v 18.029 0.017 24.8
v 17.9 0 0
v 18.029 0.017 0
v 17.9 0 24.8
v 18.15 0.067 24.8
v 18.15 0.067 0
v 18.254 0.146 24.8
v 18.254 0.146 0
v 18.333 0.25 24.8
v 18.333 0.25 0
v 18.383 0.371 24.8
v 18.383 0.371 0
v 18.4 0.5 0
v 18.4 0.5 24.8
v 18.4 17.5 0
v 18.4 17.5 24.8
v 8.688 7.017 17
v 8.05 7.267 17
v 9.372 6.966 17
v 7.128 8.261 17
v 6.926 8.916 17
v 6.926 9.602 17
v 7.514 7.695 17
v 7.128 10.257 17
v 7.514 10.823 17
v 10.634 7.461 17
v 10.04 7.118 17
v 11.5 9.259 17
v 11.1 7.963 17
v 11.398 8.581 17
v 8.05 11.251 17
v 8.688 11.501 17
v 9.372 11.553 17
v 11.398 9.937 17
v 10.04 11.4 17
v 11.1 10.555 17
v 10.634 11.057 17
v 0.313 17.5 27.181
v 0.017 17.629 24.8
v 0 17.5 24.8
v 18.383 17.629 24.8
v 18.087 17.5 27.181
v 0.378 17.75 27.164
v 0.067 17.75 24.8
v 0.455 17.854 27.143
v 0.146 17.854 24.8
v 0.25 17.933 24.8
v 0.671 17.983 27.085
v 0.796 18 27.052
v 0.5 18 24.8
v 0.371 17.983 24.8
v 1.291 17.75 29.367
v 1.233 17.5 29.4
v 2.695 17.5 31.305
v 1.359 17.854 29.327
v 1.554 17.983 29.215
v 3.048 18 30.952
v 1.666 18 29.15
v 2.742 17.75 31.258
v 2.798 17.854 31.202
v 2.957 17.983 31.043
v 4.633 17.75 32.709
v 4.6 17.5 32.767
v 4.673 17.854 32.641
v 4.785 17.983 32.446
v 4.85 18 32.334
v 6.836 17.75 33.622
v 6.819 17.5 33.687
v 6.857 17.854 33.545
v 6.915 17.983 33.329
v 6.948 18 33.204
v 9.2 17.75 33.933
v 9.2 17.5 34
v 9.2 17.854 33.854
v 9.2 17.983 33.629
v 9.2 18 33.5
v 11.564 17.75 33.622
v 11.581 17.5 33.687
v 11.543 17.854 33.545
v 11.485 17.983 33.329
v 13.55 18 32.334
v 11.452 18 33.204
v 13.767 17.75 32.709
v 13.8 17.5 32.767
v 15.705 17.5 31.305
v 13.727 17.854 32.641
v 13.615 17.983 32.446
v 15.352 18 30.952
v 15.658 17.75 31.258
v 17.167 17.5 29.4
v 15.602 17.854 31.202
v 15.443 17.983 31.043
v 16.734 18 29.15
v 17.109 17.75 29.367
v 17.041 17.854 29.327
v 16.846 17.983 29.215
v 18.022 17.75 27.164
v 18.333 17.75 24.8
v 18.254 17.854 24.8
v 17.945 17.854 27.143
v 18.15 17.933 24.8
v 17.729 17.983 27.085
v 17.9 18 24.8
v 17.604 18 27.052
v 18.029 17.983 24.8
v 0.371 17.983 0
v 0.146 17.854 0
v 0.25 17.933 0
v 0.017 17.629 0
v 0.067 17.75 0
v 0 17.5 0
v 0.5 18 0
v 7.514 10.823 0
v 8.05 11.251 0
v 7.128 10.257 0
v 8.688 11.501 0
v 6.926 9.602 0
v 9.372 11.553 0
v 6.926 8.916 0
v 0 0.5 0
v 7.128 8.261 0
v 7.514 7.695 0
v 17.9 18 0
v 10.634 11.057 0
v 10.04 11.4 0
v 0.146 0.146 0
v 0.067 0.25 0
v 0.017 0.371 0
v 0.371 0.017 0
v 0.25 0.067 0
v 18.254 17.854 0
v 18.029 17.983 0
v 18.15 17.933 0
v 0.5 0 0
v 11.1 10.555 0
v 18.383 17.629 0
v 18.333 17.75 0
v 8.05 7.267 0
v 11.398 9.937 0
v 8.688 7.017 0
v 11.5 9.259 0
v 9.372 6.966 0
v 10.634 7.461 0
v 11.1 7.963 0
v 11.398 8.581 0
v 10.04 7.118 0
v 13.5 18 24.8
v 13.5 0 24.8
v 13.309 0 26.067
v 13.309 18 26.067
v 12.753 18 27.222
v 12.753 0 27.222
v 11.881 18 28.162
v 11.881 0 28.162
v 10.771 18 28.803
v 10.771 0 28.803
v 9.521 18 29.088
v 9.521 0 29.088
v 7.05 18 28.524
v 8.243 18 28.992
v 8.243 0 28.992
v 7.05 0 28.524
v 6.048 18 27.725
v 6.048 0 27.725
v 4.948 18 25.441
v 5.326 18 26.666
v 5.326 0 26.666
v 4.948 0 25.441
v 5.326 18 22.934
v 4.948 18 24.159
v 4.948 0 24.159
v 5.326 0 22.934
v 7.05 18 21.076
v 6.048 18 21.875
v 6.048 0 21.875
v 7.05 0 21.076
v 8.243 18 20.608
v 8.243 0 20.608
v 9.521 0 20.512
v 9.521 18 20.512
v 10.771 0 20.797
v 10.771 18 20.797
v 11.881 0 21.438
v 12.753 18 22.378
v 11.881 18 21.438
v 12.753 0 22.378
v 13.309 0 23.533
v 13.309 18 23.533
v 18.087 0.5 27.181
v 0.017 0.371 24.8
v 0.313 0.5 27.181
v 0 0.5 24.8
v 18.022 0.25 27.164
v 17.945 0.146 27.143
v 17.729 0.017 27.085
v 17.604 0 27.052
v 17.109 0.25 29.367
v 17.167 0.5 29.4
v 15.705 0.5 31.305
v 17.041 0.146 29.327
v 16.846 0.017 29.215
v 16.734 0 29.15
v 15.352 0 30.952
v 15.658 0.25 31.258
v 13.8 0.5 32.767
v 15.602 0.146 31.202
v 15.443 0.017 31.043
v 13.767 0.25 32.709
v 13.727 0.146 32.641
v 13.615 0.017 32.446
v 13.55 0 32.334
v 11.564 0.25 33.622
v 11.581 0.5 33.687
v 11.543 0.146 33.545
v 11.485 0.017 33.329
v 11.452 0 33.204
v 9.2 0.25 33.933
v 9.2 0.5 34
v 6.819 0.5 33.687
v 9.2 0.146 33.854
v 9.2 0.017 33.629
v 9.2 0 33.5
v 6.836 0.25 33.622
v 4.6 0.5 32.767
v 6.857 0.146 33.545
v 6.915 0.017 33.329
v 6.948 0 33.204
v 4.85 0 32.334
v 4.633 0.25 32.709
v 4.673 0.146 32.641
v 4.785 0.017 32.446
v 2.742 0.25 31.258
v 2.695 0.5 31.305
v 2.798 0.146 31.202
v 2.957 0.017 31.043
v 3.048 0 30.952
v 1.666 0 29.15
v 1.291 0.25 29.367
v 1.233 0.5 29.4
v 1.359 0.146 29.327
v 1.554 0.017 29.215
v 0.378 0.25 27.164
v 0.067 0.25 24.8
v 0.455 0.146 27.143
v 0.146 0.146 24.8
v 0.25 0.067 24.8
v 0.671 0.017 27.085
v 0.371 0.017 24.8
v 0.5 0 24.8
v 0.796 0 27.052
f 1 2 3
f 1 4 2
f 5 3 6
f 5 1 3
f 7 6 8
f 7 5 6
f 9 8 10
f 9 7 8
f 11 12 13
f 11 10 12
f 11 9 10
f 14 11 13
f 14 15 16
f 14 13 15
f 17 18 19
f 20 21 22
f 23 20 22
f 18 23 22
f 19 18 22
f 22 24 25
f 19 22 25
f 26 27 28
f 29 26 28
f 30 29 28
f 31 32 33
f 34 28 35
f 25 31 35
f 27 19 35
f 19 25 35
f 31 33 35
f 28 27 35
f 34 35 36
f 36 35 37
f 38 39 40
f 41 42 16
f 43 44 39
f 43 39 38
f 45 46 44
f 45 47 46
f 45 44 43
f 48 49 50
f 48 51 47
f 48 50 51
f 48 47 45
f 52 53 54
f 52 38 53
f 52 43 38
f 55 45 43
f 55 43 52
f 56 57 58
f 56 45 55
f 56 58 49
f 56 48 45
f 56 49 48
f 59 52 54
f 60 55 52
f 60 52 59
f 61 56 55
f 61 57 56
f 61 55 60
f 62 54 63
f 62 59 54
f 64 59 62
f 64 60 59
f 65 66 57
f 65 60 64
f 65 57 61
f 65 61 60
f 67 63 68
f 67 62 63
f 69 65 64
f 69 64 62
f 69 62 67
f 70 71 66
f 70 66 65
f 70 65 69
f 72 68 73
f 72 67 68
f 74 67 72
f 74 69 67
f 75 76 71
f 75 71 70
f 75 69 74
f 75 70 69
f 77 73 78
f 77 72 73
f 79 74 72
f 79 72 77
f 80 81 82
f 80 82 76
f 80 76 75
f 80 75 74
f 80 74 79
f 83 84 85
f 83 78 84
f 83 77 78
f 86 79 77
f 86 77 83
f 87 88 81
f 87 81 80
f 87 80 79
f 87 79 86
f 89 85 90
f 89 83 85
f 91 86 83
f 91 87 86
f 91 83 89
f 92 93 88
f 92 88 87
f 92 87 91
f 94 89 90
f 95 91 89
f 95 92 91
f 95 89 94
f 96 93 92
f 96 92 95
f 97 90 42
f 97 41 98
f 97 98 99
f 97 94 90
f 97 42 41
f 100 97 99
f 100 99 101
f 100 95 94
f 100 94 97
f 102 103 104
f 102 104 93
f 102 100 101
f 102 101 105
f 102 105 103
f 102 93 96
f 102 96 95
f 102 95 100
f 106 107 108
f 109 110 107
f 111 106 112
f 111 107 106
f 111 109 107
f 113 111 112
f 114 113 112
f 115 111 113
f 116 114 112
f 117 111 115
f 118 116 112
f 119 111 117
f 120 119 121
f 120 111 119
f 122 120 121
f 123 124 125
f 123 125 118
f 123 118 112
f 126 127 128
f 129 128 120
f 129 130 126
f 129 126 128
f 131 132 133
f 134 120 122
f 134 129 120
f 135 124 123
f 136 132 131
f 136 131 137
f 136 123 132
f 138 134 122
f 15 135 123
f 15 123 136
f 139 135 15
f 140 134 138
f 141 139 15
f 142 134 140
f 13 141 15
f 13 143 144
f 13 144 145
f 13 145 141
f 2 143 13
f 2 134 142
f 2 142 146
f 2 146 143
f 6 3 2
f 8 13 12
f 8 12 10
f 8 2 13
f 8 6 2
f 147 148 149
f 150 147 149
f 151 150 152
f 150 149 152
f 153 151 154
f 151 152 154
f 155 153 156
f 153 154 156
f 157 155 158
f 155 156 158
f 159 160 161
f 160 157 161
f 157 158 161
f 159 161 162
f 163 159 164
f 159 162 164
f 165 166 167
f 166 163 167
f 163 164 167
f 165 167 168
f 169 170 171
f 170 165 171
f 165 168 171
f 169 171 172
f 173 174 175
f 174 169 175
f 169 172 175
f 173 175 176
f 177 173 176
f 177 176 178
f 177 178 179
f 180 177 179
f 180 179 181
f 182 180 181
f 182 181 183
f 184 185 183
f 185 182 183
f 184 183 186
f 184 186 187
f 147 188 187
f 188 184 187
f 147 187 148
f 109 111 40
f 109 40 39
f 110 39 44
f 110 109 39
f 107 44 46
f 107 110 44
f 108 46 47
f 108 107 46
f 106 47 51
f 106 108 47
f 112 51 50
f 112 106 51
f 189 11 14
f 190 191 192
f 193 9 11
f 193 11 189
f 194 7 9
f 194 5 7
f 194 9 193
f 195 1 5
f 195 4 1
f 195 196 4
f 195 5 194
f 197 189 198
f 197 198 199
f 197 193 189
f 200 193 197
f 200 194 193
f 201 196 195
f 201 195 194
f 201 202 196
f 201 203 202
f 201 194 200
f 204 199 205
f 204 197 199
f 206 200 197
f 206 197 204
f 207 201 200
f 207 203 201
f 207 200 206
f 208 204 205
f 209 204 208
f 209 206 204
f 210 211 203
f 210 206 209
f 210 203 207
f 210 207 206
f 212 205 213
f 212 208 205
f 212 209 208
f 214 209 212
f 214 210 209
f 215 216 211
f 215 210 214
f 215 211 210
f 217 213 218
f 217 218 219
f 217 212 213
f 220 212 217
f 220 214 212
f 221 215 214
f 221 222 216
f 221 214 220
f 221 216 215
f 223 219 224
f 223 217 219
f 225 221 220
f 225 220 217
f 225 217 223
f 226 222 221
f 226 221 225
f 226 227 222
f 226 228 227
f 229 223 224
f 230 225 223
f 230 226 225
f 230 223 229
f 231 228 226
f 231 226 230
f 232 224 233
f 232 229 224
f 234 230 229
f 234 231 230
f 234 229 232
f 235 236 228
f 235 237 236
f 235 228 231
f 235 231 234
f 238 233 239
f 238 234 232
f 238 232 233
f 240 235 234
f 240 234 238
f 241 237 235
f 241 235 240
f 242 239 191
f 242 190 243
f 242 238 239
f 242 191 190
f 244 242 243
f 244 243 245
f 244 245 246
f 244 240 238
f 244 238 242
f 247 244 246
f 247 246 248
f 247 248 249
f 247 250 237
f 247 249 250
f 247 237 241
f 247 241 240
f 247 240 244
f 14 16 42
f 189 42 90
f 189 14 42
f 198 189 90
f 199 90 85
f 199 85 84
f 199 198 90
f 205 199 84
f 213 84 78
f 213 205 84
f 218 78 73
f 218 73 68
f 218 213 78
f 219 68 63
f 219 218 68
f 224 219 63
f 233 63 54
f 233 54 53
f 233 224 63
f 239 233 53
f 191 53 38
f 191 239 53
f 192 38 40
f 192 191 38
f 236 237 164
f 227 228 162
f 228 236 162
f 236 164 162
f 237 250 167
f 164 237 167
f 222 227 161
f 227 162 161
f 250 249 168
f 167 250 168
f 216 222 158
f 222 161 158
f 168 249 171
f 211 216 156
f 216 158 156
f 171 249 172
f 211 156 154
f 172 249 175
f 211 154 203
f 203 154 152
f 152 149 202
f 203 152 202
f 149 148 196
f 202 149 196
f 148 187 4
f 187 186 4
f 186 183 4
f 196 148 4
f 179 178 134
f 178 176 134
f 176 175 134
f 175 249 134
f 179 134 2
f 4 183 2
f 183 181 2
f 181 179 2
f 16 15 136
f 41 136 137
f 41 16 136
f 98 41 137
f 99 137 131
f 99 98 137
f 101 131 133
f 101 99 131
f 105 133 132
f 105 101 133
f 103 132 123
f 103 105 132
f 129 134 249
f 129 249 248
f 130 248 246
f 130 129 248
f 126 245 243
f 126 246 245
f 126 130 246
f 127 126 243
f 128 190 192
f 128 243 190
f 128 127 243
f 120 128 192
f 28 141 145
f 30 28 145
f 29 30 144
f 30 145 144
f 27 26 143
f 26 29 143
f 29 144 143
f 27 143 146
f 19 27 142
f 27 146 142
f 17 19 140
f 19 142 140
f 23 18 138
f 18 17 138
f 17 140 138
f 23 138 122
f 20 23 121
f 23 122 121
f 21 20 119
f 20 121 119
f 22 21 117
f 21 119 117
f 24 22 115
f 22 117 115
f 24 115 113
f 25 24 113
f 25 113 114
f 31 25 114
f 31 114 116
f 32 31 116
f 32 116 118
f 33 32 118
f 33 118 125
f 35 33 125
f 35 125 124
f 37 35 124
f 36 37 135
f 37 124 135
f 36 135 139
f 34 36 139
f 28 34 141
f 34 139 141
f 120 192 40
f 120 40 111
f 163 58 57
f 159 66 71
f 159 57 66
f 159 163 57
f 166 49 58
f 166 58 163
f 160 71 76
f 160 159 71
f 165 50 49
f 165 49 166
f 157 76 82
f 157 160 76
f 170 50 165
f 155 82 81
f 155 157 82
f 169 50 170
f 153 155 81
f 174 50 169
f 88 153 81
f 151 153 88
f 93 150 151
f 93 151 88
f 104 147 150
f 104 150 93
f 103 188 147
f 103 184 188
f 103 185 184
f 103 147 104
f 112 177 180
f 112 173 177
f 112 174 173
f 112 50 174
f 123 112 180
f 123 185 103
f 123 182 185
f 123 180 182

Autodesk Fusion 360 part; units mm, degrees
sketch "Sketch1" plane through (0, 0, 0) normal (0, 1, 0) x (1, 0, 0)
  line L0 (0, 0) -> (18.4, 0)
  line L1 (18.4, 0) -> (18.4, -34)
  line L2 (18.4, -34) -> (0, -34)
  line L3 (0, -34) -> (0, 0)
  circle A0 centre (9.2, -24.8) radius 9.2
  circle A1 centre (9.2, -24.8) radius 4.3
  dimension "d1" = 18.4
  dimension "d2" = 34
  dimension "d3" = 4.9
extrude "Extrude2" add sketch "Sketch1" along normal blind 18 contours L0 L1 L3 A0 | A0
fillet "Fillet1" radius 0.5 6 edges at (18.4, 0, 12.4) (9.2, 0, 34) (0, 0, 12.4) (0, 18, 12.4) (9.2, 18, 34) (18.4, 18, 12.4)
sketch "Sketch2" plane through (0, 0, 0) normal (0, 0, 1) x (1, 0, 0)
  line L0 (18.4, 0.5) -> (18.4, 17.5)
sketch "Sketch3" plane through (0, 0, 0) normal (0, 0, 1) x (1, 0, 0)
  circle A0 centre (9.2, 9.2591) radius 2.3
  dimension "d9" = 4.6
extrude "Extrude3" cut sketch "Sketch3" along normal blind 17
